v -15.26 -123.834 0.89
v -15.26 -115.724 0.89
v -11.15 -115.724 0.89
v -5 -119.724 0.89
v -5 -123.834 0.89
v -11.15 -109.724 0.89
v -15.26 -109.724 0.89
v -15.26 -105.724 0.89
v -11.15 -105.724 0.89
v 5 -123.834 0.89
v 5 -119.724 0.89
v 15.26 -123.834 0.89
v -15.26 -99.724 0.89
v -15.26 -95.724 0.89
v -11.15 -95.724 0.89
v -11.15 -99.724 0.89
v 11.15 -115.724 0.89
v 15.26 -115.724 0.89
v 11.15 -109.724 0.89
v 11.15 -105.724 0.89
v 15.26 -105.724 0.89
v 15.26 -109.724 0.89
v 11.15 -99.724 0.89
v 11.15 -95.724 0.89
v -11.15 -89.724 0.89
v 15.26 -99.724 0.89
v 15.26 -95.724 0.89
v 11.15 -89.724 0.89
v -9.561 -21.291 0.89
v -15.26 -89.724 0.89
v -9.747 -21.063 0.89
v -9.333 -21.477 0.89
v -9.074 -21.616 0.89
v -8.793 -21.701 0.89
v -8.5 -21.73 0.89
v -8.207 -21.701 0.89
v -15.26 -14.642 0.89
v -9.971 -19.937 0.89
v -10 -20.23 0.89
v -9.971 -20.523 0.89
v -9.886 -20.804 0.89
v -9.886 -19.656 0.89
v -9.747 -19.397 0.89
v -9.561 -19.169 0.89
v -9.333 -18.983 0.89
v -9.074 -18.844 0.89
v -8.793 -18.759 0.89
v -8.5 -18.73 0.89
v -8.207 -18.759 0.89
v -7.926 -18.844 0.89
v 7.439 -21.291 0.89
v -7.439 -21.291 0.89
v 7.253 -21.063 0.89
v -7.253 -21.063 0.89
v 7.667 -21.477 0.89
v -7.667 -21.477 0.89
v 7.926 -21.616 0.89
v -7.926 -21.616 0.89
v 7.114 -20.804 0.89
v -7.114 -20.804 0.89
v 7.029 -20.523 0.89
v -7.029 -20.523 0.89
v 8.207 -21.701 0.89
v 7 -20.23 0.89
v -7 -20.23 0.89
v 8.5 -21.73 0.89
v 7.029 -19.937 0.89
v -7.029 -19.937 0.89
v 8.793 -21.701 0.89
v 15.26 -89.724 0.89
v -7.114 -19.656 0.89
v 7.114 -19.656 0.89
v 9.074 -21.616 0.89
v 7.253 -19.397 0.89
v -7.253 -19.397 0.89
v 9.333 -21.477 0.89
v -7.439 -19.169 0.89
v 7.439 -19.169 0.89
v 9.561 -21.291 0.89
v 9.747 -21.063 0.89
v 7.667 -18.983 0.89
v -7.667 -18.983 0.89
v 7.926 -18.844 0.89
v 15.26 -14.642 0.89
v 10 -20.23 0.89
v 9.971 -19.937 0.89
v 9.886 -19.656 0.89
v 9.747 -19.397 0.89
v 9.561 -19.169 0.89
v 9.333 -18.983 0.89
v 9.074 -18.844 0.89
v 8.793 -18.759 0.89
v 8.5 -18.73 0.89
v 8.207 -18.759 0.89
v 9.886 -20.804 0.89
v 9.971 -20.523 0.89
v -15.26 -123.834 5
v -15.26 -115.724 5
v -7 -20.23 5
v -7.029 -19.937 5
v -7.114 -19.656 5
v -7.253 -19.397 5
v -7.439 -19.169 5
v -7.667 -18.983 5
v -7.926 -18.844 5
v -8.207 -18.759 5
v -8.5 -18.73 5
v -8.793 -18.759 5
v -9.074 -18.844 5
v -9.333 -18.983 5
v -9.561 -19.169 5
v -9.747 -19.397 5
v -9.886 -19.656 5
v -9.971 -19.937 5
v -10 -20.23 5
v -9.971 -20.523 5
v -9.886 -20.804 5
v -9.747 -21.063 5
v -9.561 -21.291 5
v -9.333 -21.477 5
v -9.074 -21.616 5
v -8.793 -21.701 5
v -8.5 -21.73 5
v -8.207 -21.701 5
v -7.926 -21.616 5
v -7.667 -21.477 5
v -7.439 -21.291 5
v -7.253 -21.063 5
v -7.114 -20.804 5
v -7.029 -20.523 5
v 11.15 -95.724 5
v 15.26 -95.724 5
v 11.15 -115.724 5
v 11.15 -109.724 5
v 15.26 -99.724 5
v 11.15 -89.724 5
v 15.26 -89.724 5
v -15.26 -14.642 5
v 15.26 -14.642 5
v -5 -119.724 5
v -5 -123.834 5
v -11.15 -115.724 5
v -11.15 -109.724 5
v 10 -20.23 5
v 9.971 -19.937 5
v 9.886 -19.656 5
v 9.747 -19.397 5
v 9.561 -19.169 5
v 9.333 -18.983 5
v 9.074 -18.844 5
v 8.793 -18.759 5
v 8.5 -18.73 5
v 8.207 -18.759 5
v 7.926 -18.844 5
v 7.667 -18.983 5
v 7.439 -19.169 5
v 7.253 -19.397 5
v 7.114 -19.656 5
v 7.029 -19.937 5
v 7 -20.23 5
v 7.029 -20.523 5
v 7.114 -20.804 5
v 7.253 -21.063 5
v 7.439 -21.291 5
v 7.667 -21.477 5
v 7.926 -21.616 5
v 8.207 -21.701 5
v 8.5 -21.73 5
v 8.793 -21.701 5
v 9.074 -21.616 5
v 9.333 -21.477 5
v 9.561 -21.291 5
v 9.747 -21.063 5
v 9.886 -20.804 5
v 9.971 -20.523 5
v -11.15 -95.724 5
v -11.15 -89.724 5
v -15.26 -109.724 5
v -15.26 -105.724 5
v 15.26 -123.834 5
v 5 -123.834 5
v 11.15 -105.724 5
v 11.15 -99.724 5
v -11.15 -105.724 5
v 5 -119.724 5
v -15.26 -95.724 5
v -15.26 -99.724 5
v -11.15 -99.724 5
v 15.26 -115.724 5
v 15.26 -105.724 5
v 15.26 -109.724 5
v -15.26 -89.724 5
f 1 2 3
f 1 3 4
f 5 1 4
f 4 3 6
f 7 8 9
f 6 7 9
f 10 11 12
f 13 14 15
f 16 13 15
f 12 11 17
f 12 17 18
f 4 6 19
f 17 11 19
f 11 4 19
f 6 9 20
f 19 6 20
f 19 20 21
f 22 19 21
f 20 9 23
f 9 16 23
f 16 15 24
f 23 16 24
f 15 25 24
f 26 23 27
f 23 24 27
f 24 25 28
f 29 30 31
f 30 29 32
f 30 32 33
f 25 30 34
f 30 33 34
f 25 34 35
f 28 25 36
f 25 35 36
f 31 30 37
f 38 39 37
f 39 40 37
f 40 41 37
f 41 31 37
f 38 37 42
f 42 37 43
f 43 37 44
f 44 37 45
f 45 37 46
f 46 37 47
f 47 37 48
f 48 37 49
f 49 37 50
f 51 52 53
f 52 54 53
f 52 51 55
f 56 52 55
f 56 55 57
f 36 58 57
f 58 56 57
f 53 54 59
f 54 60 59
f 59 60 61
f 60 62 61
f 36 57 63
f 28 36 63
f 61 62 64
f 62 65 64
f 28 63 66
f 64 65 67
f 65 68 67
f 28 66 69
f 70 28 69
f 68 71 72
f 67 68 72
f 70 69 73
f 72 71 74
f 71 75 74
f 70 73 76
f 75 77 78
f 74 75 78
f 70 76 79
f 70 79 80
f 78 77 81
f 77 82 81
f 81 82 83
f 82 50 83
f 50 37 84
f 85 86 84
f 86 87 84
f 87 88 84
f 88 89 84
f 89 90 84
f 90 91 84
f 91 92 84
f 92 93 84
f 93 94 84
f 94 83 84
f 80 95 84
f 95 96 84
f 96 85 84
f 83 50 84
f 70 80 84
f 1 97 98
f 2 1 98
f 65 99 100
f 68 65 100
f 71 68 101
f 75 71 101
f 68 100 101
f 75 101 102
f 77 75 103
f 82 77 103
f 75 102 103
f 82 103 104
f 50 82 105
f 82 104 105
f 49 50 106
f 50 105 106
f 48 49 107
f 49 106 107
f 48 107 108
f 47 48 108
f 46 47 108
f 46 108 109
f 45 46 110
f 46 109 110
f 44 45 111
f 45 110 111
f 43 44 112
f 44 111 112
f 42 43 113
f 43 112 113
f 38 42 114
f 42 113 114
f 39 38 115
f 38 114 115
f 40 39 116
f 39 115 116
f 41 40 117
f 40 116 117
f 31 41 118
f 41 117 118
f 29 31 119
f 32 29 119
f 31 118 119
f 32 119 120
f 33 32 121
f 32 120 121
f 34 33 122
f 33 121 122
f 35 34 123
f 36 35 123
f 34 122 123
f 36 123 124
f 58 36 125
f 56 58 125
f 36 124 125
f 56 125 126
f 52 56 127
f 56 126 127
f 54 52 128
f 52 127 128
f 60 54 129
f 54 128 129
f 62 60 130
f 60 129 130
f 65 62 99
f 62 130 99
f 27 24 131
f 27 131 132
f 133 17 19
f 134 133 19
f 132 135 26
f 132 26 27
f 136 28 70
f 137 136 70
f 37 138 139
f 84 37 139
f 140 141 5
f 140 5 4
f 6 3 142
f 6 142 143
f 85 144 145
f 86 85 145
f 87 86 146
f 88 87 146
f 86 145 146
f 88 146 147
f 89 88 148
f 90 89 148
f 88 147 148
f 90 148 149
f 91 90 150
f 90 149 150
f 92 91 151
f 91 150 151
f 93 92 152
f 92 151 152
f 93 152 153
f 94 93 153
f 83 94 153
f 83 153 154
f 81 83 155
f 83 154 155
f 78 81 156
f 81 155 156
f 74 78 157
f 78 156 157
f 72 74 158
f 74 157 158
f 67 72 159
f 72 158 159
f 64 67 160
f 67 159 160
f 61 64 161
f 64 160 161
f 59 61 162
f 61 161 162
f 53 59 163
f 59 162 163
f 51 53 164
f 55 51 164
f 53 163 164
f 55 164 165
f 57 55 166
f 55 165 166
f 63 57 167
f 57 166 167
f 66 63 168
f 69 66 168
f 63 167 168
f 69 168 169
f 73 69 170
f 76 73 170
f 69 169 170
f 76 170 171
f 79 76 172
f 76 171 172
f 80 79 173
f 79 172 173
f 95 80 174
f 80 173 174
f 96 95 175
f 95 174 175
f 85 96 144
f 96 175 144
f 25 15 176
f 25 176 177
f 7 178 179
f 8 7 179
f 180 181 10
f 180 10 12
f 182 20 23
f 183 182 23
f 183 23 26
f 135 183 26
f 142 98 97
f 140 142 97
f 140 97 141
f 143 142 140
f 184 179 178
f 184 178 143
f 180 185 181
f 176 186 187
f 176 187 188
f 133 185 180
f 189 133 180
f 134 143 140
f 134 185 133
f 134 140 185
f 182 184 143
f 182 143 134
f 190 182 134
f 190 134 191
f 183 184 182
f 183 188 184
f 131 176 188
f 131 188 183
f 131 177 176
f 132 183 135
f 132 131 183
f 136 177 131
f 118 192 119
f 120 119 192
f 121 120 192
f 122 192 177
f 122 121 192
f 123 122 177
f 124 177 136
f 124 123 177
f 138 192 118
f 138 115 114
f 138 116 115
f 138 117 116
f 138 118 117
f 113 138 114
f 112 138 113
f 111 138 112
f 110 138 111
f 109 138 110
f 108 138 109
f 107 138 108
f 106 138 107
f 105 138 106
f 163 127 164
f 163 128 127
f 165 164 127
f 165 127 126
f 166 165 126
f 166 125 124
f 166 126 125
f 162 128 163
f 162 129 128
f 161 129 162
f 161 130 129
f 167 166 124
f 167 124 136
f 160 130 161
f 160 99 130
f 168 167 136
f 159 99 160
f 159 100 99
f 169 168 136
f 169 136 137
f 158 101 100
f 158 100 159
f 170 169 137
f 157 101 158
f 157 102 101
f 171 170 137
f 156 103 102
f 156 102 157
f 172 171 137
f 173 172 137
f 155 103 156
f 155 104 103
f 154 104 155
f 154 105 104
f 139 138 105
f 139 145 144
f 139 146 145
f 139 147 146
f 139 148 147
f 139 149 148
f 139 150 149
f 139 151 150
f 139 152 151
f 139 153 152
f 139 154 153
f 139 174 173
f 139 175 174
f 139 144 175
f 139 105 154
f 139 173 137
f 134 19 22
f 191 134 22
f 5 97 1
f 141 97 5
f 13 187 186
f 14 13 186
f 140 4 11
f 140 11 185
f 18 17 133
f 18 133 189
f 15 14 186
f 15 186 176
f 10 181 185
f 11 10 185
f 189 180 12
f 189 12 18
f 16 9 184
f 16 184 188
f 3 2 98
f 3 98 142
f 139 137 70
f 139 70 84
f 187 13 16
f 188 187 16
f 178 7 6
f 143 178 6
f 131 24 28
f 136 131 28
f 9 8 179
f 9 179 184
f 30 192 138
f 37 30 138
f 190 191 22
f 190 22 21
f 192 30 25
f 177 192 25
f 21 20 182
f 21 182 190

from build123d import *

# Parameters (mm, degrees)
MOTOR_SUPPORT_FRONT_PADDLE_MASTER_2_W = 30.52
MOTOR_SUPPORT_FRONT_PADDLE_MASTER_2_H = 109.191376887
MOTOR_SUPPORT_FRONT_PADDLE_MASTER_2_R = 1.5
BOSS_EXTRUDE1_DEPTH                   = 4.11
CUT_EXTRUDE1_START                    = -37.61
SKETCH14_PADDLE_MASTER_2_W            = 4.11
SKETCH14_PADDLE_MASTER_2_H            = 6
CUT_EXTRUDE1_DEPTH                    = 4.11
PADDLE_MASTER_START                   = -5
PADDLE_MASTER_OUTLINE_W               = 4.11
PADDLE_MASTER_OUTLINE_H               = 4.11
PADDLE_MASTER_DEPTH                   = 10


# Read off the part's stored shape, not the designer's step: paddle_master
with BuildPart() as part:
    # motor_support_front-paddle_master<2> → Boss-Extrude1 (new body)
    with BuildSketch(Plane(origin=(0, -2.5, 5), x_dir=(1, 0, 0), z_dir=(0, 0, 1))):
        with Locations((0, -66.737824068)):
            Rectangle(MOTOR_SUPPORT_FRONT_PADDLE_MASTER_2_W, MOTOR_SUPPORT_FRONT_PADDLE_MASTER_2_H)
        with Locations((8.5, -17.73)):
            Circle(MOTOR_SUPPORT_FRONT_PADDLE_MASTER_2_R, mode=Mode.SUBTRACT)
        with Locations((-8.5, -17.73)):
            Circle(MOTOR_SUPPORT_FRONT_PADDLE_MASTER_2_R, mode=Mode.SUBTRACT)
    extrude(amount=-BOSS_EXTRUDE1_DEPTH)

    # Sketch14-paddle_master<2> → Cut-Extrude1 (cut)
    with BuildSketch(Plane(origin=(11.15, 12.5, 38.5), x_dir=(1, 0, 0), z_dir=(0, 0, 1)).offset(CUT_EXTRUDE1_START)):
        with Locations((-24.355, -125.223512511)):
            Rectangle(SKETCH14_PADDLE_MASTER_2_W, SKETCH14_PADDLE_MASTER_2_H)
        with Locations((-24.355, -115.223512511)):
            Rectangle(SKETCH14_PADDLE_MASTER_2_W, SKETCH14_PADDLE_MASTER_2_H)
        with Locations((-24.355, -105.223512511)):
            Rectangle(SKETCH14_PADDLE_MASTER_2_W, SKETCH14_PADDLE_MASTER_2_H)
        with Locations((2.055, -125.223512511)):
            Rectangle(SKETCH14_PADDLE_MASTER_2_W, SKETCH14_PADDLE_MASTER_2_H)
        with Locations((2.055, -115.223512511)):
            Rectangle(SKETCH14_PADDLE_MASTER_2_W, SKETCH14_PADDLE_MASTER_2_H)
        with Locations((2.055, -105.223512511)):
            Rectangle(SKETCH14_PADDLE_MASTER_2_W, SKETCH14_PADDLE_MASTER_2_H)
    extrude(amount=CUT_EXTRUDE1_DEPTH, mode=Mode.SUBTRACT)

    # paddle_master outline → paddle_master (cut)
    with BuildSketch(Plane.YZ.offset(PADDLE_MASTER_START)):
        with Locations((-121.778512511, 2.945)):
            Rectangle(PADDLE_MASTER_OUTLINE_W, PADDLE_MASTER_OUTLINE_H)
    extrude(amount=PADDLE_MASTER_DEPTH, mode=Mode.SUBTRACT)


solid = part.part
